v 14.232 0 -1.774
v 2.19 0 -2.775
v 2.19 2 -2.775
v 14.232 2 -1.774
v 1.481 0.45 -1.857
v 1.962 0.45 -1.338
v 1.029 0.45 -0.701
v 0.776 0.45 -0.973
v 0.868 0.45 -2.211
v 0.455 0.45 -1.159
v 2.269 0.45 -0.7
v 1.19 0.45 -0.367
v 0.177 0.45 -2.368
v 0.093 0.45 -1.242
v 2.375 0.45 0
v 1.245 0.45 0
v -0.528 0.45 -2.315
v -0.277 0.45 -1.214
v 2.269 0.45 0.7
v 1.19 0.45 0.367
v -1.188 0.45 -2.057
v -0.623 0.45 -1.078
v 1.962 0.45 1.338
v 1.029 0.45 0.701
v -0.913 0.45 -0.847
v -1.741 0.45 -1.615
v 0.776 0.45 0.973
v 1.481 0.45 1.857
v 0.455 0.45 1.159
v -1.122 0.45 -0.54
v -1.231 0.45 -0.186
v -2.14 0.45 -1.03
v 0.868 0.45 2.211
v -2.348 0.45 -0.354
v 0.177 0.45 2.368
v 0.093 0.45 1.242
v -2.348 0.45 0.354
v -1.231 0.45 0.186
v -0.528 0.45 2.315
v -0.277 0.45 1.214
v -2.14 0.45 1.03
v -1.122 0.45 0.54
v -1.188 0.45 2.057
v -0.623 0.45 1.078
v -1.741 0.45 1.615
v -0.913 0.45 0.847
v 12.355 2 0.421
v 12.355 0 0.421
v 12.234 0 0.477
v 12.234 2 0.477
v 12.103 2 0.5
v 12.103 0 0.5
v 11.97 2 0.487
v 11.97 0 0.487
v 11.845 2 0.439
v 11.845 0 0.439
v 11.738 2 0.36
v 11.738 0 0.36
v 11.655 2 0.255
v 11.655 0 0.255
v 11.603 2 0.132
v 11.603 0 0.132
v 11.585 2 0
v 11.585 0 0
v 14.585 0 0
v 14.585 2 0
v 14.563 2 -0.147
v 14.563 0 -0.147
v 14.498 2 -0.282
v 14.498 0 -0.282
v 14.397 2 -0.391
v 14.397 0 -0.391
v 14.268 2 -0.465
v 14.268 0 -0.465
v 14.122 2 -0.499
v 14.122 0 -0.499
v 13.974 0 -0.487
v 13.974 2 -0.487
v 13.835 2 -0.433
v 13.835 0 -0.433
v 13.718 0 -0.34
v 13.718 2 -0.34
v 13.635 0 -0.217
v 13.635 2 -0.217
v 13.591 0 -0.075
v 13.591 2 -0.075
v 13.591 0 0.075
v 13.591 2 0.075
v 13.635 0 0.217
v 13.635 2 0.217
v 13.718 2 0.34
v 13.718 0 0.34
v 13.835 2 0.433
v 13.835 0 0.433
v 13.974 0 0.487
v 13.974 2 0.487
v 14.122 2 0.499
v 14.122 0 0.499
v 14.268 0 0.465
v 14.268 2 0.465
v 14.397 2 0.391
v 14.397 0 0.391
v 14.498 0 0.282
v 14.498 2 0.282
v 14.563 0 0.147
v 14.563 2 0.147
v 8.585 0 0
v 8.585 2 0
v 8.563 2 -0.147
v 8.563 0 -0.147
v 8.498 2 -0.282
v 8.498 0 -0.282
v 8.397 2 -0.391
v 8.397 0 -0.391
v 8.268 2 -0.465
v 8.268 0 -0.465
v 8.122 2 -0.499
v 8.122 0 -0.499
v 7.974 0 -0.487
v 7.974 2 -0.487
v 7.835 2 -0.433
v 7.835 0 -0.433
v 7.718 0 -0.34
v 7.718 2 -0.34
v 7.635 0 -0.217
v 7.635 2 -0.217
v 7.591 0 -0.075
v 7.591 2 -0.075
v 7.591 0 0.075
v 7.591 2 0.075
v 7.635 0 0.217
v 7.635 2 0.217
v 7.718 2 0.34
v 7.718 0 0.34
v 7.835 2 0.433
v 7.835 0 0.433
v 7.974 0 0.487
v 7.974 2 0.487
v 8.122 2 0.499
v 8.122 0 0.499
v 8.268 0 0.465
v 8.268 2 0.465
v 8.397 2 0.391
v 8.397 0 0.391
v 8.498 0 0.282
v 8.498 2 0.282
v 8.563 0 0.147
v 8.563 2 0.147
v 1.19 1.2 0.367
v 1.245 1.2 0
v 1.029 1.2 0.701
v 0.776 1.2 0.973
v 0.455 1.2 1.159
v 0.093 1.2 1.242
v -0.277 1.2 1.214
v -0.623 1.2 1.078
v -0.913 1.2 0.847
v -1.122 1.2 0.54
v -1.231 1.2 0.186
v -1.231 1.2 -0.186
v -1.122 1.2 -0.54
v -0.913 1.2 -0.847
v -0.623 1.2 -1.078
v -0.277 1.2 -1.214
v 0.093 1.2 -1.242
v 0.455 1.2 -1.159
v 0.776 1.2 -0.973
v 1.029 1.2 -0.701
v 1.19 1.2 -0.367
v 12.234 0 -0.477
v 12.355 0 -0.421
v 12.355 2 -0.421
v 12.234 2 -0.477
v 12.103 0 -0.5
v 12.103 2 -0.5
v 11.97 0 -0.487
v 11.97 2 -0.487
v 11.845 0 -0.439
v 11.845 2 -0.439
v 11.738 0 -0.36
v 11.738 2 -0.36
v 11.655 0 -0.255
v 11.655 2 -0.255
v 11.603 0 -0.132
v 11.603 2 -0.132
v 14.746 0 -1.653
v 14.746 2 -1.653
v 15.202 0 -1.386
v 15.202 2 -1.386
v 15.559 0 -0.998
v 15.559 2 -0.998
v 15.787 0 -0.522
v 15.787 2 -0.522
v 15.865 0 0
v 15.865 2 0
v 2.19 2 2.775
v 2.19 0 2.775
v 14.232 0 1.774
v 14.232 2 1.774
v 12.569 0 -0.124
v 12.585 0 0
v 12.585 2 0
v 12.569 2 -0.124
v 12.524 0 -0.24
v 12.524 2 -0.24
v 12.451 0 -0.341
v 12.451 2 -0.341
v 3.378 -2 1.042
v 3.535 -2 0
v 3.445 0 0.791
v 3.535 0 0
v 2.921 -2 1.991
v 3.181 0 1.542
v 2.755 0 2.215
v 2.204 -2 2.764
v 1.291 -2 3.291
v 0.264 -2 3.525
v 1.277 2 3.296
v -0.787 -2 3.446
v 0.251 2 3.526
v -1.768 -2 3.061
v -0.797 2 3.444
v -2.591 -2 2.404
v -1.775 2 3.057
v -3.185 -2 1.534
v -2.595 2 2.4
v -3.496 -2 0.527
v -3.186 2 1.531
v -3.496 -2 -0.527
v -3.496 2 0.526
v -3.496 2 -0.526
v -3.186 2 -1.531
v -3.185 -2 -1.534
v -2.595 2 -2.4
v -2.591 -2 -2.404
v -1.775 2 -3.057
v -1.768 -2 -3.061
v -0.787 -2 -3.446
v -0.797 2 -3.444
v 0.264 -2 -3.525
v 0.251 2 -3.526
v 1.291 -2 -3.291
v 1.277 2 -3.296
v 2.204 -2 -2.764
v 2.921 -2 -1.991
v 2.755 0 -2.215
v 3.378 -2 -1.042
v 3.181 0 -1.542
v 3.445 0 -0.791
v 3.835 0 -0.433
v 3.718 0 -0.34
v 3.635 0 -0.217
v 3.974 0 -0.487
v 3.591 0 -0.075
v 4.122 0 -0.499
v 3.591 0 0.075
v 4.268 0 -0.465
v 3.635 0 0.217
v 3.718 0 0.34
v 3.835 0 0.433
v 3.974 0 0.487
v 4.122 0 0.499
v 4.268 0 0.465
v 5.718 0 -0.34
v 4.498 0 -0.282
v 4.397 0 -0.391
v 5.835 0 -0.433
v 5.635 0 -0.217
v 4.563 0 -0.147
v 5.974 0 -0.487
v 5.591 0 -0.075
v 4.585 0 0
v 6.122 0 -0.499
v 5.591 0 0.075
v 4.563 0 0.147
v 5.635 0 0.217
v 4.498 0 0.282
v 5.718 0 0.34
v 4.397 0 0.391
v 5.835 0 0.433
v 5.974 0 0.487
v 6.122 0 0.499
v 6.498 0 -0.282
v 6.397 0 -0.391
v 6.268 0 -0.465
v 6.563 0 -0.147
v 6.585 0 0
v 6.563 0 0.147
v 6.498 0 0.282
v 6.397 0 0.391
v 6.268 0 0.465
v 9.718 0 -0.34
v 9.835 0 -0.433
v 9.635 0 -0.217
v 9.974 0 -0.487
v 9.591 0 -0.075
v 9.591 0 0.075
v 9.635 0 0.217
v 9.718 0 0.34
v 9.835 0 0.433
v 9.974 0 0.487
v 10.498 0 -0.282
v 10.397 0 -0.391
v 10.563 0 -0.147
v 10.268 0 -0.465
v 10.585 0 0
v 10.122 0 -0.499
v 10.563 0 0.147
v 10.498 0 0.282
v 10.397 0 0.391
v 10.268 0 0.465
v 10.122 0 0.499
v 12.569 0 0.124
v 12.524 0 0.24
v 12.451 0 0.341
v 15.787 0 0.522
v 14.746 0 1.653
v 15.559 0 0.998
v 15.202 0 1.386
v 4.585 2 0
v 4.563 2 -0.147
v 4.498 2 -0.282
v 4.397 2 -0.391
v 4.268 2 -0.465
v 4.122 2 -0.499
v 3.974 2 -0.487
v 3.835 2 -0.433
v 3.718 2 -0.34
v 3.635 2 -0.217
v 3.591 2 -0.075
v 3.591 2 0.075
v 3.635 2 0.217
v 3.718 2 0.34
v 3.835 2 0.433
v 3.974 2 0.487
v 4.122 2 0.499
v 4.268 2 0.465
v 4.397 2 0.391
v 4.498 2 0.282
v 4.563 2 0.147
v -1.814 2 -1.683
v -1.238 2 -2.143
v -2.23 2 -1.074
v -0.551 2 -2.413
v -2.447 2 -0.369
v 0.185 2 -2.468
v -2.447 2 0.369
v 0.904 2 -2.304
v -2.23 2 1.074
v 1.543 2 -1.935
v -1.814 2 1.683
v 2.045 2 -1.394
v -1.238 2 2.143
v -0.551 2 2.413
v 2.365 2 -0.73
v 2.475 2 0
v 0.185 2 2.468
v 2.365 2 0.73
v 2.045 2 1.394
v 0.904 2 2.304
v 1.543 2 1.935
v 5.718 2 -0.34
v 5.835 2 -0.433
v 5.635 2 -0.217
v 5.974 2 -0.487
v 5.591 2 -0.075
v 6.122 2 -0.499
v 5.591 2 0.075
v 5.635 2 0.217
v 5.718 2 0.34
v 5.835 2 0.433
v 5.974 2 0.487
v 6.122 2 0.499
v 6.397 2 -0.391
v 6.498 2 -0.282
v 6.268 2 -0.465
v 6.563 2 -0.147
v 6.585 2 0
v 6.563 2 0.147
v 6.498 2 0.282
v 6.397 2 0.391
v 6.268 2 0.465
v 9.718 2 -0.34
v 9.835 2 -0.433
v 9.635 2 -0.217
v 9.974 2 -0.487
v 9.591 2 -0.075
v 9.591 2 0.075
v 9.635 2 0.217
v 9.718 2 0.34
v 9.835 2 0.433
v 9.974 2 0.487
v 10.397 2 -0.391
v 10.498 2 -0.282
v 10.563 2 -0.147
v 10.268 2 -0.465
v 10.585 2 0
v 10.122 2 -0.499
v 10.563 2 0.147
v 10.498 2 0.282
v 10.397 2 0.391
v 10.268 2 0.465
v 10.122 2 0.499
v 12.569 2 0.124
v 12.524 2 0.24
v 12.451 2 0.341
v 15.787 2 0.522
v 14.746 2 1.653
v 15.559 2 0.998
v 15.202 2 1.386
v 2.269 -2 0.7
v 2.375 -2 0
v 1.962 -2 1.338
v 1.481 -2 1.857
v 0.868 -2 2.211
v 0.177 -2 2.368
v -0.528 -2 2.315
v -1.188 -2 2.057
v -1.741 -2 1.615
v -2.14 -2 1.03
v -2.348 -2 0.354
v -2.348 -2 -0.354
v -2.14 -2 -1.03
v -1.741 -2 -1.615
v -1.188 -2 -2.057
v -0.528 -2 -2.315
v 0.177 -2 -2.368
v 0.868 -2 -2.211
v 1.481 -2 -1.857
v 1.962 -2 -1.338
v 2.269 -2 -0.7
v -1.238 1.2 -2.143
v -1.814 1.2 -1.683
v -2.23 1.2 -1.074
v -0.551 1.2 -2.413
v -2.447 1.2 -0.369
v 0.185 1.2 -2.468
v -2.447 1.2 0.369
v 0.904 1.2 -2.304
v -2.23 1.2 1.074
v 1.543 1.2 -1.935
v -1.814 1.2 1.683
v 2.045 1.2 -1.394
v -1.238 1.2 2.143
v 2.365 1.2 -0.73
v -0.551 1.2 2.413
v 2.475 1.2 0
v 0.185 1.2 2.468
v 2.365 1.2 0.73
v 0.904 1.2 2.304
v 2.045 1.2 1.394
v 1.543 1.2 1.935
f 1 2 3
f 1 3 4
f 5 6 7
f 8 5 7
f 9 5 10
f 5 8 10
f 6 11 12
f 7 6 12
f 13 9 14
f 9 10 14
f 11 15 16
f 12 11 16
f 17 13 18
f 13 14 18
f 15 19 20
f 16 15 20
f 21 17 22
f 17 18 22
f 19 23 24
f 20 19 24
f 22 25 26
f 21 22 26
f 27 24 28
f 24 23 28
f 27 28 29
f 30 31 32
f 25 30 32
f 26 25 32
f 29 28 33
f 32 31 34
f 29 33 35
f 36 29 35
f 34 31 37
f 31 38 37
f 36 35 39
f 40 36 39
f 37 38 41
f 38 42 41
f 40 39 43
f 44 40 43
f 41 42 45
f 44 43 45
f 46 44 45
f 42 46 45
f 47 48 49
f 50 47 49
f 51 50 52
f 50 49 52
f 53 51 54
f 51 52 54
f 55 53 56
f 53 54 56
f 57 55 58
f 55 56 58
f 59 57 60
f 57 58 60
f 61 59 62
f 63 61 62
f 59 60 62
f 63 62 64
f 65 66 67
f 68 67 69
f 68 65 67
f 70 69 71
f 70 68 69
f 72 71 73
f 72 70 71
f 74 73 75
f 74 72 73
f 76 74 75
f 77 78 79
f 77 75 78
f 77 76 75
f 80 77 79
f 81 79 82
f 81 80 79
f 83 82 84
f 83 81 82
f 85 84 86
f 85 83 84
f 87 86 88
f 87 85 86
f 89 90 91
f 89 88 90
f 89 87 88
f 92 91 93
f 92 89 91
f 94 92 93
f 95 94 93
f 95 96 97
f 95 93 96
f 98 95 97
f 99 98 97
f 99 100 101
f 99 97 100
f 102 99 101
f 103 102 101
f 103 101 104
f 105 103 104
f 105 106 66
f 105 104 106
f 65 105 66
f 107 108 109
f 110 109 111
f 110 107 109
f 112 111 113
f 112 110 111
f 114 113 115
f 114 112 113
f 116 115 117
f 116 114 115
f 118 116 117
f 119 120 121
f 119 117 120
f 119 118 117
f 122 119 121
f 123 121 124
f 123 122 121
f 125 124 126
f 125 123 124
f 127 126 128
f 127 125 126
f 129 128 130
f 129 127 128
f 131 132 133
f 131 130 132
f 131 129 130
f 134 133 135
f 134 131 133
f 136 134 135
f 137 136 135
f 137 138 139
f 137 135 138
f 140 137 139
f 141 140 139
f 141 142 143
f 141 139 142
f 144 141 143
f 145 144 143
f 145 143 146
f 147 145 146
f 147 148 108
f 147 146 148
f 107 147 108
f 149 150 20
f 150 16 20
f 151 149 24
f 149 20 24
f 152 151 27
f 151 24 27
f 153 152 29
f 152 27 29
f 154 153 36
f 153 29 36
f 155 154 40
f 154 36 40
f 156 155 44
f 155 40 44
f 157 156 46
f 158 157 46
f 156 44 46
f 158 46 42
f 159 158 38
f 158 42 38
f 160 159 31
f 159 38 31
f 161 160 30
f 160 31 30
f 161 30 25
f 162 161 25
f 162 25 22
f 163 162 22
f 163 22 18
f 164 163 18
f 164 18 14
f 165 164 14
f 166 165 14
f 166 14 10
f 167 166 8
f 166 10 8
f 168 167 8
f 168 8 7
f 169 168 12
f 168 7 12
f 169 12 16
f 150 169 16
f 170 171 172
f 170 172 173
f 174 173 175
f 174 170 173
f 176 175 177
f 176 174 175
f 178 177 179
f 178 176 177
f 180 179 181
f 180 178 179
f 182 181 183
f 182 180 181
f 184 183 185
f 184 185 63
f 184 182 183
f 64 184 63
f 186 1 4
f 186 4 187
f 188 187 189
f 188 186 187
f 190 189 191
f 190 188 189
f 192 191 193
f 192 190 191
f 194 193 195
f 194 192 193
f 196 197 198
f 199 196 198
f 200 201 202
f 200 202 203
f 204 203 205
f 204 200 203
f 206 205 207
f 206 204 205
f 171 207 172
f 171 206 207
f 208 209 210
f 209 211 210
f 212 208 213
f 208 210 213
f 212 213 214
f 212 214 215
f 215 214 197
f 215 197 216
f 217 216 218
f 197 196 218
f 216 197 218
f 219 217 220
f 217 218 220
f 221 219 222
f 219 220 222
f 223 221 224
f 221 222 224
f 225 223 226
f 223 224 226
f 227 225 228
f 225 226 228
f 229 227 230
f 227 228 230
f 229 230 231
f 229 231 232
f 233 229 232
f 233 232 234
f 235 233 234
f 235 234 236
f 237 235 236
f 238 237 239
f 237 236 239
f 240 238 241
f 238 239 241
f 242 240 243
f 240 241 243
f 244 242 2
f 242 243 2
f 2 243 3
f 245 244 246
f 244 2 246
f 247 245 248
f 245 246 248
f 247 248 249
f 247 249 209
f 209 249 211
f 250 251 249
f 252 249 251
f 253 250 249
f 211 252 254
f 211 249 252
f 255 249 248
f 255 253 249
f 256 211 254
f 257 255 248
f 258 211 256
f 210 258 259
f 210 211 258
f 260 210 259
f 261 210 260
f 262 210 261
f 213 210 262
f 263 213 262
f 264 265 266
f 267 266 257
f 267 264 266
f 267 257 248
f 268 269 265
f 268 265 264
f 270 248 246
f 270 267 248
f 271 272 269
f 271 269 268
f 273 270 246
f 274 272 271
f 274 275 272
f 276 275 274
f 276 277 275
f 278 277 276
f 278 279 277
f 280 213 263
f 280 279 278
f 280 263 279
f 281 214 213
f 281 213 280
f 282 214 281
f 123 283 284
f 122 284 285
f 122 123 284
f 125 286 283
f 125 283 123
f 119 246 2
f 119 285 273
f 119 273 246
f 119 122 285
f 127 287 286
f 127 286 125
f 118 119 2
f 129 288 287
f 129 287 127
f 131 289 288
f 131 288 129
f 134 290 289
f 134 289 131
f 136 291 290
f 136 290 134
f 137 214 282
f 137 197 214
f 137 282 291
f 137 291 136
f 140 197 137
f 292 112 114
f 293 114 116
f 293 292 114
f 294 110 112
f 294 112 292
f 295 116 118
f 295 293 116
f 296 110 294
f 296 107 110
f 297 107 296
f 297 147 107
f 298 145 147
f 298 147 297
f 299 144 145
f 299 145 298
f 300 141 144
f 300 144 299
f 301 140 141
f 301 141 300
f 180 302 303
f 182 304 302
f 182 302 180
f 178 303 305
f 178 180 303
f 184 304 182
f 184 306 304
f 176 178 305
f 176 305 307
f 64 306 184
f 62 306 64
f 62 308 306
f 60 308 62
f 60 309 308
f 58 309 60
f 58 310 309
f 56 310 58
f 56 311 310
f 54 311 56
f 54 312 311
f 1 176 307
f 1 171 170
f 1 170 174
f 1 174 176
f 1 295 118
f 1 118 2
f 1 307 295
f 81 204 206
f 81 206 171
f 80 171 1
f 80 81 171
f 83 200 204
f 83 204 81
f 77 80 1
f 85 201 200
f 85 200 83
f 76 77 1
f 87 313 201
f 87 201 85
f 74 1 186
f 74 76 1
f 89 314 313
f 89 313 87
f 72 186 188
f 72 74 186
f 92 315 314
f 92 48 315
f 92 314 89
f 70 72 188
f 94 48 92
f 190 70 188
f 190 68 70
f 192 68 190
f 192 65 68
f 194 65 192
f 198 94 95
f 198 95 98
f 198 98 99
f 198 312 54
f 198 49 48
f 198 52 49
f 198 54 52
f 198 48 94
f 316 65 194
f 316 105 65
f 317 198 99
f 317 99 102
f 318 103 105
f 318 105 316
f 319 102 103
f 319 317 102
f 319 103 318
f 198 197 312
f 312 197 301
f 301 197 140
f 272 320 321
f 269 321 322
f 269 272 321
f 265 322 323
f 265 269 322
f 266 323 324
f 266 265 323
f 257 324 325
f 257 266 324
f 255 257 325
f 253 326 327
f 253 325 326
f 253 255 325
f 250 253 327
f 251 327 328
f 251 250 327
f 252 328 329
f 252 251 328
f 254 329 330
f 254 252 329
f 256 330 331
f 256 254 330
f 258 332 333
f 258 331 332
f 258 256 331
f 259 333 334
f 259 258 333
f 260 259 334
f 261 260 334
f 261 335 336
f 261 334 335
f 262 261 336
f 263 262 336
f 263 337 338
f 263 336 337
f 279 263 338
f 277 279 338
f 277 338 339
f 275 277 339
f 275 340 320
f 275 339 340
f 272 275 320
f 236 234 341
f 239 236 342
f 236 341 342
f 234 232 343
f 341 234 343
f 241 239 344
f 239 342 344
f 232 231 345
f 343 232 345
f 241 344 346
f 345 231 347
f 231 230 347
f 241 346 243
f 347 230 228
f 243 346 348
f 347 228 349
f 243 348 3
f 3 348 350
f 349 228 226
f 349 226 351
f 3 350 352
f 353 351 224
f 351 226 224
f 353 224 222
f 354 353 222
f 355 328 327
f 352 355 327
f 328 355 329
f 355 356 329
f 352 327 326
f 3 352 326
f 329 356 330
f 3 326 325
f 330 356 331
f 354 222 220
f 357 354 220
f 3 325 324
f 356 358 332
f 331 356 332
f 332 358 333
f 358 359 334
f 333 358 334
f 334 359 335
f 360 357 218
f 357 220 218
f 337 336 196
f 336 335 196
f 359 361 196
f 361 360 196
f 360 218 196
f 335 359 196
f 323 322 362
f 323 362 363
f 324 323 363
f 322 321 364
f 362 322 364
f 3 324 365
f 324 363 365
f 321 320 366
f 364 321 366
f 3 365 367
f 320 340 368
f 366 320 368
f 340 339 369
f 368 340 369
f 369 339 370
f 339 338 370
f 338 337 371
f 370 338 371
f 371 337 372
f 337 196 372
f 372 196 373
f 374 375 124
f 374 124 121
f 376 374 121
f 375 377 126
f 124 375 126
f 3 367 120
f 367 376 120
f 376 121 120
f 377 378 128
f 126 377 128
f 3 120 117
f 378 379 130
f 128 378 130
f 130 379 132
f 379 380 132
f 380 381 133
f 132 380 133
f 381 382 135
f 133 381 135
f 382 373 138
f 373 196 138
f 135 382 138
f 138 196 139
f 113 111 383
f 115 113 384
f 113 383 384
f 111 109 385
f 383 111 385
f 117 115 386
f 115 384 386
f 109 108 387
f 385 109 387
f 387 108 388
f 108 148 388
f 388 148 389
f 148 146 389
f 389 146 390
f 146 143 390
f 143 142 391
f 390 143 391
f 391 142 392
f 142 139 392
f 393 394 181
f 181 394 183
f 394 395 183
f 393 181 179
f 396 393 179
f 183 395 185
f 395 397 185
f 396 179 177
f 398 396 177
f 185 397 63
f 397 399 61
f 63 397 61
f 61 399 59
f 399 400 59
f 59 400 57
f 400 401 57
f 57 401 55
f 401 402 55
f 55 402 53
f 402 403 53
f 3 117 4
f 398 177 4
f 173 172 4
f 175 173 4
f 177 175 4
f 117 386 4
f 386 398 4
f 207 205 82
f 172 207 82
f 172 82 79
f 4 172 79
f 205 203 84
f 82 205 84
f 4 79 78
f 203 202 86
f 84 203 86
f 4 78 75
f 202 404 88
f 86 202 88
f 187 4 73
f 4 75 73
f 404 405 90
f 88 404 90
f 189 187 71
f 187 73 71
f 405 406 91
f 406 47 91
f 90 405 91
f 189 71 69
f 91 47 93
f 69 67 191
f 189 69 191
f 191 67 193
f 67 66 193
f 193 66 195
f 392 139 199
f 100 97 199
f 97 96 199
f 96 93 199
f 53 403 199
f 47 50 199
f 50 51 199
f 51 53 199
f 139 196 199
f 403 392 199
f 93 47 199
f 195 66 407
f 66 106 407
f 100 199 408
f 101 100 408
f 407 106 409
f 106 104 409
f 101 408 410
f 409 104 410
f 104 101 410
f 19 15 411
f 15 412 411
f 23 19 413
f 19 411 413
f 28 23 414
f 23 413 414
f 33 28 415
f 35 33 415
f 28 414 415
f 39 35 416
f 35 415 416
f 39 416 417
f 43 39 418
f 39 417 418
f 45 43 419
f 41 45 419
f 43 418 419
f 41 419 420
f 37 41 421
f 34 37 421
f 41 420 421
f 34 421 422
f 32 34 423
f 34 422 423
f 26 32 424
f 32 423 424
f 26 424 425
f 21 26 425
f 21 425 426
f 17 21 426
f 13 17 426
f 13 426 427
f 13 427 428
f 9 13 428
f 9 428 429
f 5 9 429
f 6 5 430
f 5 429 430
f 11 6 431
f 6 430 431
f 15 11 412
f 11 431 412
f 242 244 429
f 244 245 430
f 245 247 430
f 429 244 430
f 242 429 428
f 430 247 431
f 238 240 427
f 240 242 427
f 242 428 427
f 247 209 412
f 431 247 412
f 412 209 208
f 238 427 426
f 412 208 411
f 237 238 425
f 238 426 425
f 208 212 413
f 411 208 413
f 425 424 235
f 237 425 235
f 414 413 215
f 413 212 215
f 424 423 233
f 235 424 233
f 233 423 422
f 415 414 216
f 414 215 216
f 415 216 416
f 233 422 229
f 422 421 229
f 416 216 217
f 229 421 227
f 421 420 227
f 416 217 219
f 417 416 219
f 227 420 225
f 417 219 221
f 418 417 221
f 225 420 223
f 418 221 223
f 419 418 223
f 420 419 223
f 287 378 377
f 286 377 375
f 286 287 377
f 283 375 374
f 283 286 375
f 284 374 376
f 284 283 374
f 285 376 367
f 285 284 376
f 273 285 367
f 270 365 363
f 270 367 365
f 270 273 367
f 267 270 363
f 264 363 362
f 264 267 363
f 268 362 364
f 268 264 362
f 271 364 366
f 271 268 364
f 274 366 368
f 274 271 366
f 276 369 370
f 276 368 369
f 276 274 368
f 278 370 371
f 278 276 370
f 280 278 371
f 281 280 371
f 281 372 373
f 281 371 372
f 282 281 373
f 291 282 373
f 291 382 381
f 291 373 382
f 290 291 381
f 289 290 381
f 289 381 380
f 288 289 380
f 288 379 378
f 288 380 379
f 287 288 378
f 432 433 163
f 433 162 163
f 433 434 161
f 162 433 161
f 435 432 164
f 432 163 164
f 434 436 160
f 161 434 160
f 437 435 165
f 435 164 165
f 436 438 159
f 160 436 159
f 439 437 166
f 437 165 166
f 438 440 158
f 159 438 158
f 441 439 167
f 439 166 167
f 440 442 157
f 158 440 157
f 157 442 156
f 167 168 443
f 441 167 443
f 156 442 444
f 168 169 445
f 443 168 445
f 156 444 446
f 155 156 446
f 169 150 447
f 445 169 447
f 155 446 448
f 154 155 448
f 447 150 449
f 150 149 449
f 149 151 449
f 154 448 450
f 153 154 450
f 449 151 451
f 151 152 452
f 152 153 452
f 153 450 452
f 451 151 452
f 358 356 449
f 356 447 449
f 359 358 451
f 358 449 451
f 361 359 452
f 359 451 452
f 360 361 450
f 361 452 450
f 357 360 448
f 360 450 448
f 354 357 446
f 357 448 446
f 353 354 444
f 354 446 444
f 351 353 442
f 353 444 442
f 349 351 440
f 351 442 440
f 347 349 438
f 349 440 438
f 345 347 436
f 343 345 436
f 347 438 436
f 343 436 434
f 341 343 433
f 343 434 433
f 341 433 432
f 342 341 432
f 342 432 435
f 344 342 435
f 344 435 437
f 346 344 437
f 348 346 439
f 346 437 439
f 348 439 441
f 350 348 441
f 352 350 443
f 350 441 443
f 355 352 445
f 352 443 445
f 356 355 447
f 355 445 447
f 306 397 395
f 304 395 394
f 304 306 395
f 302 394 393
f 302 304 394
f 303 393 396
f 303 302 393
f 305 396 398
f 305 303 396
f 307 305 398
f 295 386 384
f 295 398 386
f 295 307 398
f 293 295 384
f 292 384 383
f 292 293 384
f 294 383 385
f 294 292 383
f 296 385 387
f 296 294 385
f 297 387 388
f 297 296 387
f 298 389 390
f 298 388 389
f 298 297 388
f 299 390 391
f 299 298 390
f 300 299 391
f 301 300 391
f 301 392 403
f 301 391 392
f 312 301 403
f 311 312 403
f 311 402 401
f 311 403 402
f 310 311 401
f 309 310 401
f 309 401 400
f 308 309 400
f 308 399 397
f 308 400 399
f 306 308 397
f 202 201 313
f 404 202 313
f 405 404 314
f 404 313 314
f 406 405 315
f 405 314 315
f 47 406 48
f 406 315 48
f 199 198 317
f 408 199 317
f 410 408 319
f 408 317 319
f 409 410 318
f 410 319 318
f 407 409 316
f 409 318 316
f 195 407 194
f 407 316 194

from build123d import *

# Parameters (mm, degrees)
BOSS_EXTRUDE1_DEPTH = 2


with BuildPart() as part:
    # Sketch2 → Revolve1 (revolve)
    with BuildSketch(Plane.XY):
        Polygon((2.475, 2), (2.475, 1.2), (1.245, 1.2), (1.245, 0.45), (2.375, 0.45), (2.375, -2), (3.535, -2), (3.535, 2), align=None)
    revolve(axis=Axis((0, 55, 0), (0, -1, 0)))

    # Sketch3 → Boss-Extrude1 (add)
    with BuildSketch(Plane(origin=(0, 0, 0), x_dir=(1, 0, 0), z_dir=(0, 1, 0))):
        with BuildLine():
            ThreePointArc((3.535, 0), (3.180996027, -1.541910917), (2.189885842, -2.775))
            Line((2.189885842, -2.775), (14.232465575, -1.773881029))
            ThreePointArc((14.232465575, -1.773881029), (13.044016702, -1.443867644), (12.3554, -0.420575606))
            ThreePointArc((12.3554, -0.420575606), (11.845417029, -0.438862165), (11.585, 0))
            Line((11.585, 0), (10.585, 0))
            ThreePointArc((10.585, 0), (10.085, -0.5), (9.585, 0))
            Line((9.585, 0), (8.585, 0))
            ThreePointArc((8.585, 0), (8.085, -0.5), (7.585, 0))
            Line((7.585, 0), (6.585, 0))
            ThreePointArc((6.585, 0), (6.085, -0.5), (5.585, 0))
            Line((5.585, 0), (4.585, 0))
            ThreePointArc((4.585, 0), (4.085, -0.5), (3.585, 0))
            Line((3.585, 0), (3.535, 0))
        make_face()
        with BuildLine():
            ThreePointArc((12.3554, -0.420575606), (13.044016702, -1.443867644), (14.232465575, -1.773881029))
            ThreePointArc((14.232465575, -1.773881029), (15.394749733, -1.205386095), (15.865, 0))
            Line((15.865, 0), (14.585, 0))
            ThreePointArc((14.585, 0), (14.085, -0.5), (13.585, 0))
            Line((13.585, 0), (12.585, 0))
            ThreePointArc((12.585, 0), (12.523862165, -0.239582971), (12.3554, -0.420575606))
        make_face()
    boss_extrude1 = extrude(amount=BOSS_EXTRUDE1_DEPTH)

    # Mirror1: Boss-Extrude1 across plane
    add(boss_extrude1.mirror(Plane(origin=(0, 15.95383002, 0), x_dir=(1, 0, 0), z_dir=(0, 0, -1))))


solid = part.part
